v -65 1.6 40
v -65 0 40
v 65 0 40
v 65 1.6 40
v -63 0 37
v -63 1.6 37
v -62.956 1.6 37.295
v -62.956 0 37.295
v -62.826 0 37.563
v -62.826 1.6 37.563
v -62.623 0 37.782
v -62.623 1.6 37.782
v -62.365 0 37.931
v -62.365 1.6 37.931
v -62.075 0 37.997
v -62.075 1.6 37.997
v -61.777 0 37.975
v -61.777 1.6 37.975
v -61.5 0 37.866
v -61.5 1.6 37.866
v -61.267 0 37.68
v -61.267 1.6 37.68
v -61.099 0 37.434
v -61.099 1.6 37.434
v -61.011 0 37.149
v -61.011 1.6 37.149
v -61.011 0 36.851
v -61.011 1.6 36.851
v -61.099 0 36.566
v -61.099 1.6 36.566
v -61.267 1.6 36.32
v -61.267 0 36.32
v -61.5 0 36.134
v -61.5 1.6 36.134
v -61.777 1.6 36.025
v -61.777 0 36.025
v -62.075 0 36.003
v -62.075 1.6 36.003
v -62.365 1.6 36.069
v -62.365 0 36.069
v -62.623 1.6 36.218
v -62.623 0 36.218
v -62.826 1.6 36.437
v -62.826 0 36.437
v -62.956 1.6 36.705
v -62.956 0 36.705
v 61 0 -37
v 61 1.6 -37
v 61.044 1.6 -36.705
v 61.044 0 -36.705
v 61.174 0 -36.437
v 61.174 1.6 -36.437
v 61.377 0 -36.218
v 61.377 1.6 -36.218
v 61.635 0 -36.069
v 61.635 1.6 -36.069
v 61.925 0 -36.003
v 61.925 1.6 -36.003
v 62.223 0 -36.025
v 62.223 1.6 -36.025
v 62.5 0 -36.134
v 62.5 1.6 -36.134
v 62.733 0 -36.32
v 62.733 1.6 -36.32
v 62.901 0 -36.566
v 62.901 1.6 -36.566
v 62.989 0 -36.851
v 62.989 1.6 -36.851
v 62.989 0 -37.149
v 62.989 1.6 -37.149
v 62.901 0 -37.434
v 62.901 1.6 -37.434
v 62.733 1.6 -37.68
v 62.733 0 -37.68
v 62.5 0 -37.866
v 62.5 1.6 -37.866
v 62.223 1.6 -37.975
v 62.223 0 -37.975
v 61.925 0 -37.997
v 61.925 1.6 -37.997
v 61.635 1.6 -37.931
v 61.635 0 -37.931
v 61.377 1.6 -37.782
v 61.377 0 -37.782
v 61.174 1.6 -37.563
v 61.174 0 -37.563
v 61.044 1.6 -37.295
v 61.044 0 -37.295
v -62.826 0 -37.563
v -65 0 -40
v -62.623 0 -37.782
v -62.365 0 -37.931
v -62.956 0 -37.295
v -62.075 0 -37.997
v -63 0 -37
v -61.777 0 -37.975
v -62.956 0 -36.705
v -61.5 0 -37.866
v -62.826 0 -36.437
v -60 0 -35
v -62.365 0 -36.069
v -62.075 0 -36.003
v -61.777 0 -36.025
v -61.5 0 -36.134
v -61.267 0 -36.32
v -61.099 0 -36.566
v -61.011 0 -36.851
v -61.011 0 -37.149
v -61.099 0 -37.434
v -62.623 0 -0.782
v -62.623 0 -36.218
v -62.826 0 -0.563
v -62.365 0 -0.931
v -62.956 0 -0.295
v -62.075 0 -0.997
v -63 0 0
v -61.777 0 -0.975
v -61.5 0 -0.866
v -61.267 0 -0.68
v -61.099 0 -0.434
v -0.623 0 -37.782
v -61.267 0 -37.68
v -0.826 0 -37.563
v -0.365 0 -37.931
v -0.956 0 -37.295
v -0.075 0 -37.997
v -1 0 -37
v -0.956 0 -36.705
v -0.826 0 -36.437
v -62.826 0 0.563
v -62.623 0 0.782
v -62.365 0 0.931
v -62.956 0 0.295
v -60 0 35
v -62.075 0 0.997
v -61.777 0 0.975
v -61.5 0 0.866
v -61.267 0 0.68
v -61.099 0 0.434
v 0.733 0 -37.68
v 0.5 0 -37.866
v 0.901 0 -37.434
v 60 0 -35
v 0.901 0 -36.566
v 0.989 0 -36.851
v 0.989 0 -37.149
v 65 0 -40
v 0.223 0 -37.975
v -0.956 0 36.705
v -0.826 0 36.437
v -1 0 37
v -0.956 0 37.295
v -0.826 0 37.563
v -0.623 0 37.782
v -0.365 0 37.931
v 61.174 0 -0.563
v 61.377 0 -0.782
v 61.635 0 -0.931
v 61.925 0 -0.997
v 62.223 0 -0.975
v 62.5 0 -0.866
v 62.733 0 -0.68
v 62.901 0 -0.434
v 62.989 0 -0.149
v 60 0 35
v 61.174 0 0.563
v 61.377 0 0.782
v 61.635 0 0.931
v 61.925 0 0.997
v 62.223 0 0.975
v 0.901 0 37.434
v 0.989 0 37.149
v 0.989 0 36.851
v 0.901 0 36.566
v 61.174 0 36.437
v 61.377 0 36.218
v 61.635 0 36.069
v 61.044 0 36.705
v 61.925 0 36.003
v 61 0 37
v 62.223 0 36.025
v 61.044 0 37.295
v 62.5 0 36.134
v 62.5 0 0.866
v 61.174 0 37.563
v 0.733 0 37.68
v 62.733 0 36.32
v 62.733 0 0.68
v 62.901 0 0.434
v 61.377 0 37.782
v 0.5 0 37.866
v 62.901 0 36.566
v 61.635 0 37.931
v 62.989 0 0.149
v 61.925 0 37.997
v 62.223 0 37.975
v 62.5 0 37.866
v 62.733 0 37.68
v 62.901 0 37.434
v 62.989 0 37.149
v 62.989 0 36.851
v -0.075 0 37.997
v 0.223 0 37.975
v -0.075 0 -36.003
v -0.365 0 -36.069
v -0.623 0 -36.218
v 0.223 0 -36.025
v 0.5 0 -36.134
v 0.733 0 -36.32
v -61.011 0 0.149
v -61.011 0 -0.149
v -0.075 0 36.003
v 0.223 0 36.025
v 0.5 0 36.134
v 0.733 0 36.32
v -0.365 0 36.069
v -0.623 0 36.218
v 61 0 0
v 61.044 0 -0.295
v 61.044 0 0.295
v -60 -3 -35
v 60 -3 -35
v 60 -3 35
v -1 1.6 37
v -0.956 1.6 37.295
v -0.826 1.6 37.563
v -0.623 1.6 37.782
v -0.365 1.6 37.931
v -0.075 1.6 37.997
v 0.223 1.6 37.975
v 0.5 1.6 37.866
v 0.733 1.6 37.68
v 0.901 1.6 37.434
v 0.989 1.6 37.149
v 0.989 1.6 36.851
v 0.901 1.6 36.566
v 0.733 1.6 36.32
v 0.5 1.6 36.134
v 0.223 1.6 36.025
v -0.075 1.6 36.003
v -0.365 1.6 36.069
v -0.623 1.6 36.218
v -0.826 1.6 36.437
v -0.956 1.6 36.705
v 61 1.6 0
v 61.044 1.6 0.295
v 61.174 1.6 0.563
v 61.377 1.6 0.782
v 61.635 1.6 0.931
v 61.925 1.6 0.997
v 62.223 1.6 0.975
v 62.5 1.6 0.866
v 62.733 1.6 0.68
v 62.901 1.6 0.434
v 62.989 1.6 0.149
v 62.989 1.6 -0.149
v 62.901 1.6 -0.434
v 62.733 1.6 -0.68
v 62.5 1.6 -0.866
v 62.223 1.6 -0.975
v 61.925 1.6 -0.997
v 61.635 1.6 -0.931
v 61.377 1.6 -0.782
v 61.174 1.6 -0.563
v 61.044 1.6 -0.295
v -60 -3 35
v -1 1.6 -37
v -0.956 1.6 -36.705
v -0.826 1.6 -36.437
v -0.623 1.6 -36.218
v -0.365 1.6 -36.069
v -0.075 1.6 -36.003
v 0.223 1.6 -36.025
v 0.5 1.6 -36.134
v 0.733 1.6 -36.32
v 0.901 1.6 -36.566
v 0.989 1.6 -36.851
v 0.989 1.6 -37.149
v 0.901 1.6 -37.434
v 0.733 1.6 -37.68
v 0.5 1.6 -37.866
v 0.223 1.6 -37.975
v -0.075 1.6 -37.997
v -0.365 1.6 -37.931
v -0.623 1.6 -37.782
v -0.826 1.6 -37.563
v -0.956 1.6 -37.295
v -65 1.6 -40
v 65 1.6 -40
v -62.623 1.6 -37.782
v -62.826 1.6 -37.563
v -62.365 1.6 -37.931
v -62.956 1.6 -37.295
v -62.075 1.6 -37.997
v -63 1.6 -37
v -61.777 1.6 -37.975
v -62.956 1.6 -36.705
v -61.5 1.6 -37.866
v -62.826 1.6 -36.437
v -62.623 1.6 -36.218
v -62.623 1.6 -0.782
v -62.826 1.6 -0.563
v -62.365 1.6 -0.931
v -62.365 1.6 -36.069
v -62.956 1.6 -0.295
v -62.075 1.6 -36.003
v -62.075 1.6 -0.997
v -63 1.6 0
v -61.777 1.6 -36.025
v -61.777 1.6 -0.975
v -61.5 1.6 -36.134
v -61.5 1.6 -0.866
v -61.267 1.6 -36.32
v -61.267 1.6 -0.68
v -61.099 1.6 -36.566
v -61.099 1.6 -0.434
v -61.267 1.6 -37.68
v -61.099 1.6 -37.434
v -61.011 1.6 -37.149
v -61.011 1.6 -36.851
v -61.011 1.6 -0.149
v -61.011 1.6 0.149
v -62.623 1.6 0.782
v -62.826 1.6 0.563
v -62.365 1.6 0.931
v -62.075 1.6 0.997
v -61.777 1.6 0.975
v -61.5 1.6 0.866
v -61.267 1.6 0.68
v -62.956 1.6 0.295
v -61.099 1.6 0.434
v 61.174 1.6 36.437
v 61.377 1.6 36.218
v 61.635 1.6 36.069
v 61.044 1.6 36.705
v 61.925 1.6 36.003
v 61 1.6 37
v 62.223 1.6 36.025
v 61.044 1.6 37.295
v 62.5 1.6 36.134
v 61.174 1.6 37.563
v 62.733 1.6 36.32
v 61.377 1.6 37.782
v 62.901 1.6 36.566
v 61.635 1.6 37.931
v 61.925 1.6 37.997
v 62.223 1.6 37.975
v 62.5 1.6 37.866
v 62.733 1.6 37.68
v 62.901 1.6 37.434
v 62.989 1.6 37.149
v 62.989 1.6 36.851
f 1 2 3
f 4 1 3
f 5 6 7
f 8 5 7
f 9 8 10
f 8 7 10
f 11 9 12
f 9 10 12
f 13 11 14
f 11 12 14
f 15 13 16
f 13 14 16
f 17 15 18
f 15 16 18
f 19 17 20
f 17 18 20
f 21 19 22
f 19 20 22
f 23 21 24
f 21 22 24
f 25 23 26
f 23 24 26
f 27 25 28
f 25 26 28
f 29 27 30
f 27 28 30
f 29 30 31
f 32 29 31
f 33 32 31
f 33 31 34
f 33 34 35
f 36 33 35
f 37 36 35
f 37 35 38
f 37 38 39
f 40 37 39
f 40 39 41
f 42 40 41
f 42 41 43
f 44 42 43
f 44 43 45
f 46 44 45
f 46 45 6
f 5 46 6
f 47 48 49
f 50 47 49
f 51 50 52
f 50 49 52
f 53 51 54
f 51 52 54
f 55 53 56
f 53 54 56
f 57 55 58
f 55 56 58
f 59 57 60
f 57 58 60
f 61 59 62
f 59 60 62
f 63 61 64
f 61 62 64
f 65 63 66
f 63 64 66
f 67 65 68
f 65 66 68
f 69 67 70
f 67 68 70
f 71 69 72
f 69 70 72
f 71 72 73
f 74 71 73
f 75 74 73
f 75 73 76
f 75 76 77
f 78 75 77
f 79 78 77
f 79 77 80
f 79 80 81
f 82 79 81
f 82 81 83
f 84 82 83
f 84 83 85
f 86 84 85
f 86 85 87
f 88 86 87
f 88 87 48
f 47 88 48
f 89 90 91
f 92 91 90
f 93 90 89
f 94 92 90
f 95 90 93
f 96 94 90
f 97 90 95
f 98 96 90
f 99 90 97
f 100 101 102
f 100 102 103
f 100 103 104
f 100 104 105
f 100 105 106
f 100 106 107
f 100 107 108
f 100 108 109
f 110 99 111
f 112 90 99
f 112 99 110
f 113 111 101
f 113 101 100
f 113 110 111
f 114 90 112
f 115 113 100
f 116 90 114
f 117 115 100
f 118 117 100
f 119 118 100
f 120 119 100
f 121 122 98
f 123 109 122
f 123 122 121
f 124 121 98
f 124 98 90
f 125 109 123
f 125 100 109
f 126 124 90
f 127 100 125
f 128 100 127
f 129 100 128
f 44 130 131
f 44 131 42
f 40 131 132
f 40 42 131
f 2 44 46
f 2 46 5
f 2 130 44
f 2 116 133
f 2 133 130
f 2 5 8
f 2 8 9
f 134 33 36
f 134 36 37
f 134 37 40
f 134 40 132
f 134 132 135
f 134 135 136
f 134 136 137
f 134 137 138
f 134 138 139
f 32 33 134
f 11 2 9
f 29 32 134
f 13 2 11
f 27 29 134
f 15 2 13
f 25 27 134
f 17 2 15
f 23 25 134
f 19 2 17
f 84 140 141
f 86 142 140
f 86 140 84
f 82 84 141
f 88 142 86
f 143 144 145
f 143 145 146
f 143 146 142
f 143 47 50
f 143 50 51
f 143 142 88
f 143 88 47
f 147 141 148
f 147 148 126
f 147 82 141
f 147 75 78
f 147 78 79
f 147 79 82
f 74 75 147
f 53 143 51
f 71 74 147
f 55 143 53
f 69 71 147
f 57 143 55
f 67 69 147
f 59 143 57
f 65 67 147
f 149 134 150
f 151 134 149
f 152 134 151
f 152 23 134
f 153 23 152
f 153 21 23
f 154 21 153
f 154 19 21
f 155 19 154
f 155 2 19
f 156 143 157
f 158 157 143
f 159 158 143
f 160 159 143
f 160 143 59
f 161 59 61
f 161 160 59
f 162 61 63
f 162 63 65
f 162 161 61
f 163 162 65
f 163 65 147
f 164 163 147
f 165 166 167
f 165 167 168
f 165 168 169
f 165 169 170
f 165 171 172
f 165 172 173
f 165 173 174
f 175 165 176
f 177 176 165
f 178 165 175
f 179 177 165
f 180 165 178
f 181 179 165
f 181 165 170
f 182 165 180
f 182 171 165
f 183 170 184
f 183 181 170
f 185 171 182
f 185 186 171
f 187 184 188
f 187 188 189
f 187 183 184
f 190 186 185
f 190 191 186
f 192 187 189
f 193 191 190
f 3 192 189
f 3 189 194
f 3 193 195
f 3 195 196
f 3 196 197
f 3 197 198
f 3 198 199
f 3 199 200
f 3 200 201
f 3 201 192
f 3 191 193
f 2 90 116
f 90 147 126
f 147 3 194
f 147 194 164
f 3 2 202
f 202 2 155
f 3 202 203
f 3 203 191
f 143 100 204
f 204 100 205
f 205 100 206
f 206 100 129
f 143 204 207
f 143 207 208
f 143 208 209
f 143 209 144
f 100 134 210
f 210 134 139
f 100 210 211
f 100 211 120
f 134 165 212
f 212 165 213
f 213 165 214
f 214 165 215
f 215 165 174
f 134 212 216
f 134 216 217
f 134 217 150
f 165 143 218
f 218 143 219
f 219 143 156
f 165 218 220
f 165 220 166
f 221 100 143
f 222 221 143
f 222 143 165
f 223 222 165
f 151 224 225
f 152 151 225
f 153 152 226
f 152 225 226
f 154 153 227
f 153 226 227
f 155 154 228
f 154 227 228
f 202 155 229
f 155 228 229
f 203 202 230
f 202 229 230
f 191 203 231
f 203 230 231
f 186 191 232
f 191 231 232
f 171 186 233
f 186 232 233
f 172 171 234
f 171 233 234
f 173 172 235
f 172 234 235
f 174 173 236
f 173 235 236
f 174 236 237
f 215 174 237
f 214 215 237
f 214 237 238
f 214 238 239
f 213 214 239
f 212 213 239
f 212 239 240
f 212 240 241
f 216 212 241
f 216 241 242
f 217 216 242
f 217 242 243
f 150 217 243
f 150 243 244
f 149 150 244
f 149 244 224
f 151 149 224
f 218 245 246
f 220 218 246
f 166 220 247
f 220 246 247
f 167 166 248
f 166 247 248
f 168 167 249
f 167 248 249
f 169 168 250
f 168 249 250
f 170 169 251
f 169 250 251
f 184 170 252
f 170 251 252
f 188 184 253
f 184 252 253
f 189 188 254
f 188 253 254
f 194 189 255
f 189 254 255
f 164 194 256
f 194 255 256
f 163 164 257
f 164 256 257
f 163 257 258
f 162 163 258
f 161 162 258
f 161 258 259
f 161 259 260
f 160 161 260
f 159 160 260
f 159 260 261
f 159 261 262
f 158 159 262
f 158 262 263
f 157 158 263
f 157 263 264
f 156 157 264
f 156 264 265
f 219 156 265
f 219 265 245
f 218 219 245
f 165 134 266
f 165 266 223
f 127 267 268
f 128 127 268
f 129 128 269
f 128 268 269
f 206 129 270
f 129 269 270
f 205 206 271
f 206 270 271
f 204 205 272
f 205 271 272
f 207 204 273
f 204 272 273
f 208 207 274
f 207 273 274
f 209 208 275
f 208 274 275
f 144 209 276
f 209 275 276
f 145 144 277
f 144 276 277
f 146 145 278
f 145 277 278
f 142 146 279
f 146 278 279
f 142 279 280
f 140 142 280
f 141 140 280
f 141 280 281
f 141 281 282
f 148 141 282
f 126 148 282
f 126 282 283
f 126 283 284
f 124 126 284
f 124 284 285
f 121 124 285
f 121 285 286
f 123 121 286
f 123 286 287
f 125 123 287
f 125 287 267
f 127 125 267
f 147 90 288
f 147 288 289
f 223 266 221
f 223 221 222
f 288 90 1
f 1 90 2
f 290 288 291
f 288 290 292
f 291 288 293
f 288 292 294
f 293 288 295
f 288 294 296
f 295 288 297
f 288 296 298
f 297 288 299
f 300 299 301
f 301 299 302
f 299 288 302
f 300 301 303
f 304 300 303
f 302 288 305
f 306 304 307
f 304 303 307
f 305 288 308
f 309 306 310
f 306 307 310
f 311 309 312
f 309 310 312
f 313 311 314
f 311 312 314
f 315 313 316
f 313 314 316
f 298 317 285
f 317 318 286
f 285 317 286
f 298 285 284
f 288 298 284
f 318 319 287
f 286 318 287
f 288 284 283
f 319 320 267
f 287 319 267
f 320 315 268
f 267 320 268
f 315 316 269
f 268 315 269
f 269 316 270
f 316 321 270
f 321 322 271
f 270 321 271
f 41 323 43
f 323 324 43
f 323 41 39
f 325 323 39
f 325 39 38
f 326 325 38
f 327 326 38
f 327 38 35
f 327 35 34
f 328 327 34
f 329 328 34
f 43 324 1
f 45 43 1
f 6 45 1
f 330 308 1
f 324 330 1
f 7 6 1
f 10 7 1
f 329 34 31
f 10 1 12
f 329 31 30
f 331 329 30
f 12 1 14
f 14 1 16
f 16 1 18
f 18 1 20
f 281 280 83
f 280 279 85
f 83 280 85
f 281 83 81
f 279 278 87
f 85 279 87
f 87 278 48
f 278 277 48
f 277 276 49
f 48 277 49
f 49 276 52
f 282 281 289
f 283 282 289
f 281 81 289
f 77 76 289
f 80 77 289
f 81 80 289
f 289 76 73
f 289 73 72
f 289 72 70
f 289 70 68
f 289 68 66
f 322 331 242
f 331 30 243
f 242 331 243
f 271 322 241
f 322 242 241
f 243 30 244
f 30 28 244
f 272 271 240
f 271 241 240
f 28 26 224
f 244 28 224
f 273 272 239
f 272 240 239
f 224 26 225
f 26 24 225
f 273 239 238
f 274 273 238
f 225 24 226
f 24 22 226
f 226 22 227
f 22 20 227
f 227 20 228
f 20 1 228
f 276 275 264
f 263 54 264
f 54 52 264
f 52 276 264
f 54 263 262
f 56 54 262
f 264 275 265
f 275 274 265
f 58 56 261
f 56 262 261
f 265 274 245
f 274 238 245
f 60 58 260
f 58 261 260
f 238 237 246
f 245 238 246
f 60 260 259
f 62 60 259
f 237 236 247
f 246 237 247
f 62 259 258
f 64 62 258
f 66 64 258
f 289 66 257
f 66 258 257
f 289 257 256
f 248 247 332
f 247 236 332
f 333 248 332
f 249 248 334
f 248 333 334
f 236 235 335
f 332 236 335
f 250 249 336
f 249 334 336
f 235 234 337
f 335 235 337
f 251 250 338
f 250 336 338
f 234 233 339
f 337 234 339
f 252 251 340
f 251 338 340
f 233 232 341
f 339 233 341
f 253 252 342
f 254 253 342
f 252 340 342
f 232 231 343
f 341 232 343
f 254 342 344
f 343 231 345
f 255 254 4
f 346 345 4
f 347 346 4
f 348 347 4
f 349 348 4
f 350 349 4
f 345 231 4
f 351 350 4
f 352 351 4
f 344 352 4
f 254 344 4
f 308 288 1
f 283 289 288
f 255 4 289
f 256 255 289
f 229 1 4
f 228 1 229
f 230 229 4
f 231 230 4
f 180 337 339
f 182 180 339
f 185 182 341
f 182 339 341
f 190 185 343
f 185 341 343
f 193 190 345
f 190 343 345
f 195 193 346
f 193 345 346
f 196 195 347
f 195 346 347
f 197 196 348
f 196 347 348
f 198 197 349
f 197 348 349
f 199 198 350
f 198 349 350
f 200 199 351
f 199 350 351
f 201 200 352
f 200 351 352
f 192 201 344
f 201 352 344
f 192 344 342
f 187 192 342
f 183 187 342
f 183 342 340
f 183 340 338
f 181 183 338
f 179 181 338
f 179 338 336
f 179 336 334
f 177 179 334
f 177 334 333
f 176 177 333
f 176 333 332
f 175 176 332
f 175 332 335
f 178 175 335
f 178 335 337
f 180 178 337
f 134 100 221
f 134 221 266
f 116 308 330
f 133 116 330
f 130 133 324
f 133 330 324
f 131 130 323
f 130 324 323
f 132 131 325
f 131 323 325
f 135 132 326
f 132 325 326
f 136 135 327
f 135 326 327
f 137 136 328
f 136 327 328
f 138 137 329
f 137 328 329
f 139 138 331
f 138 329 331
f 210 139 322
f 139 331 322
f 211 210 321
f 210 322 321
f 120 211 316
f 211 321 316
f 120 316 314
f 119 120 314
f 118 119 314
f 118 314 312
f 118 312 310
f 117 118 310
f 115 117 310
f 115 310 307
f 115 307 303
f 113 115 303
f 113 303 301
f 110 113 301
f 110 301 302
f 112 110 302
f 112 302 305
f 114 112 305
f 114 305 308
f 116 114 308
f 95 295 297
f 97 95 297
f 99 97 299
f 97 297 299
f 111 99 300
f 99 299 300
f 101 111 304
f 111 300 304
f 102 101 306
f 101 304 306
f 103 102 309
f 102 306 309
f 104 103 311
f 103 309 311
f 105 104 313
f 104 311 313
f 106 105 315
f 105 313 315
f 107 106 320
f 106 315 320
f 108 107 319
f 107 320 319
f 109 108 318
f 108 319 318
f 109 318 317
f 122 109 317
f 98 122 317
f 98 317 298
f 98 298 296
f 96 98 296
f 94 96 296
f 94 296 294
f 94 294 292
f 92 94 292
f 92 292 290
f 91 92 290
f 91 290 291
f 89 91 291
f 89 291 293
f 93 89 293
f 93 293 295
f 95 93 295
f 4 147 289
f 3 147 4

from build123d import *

# Parameters (mm, degrees)
F0_W     = 120
F0_H     = 70
F2_DEPTH = 3
F1_W     = 130
F1_H     = 80
F3_DEPTH = 1.6
F4_D     = 2


with BuildPart() as f2:
    # F0 (on Front) → F2 (new body)
    with BuildSketch(Plane.XZ):
        Rectangle(F0_W, F0_H)
    extrude(amount=F2_DEPTH)

    # F1 (on Front) → F3 (join)
    with BuildSketch(Plane.XZ):
        Rectangle(F1_W, F1_H)
    extrude(amount=-F3_DEPTH)

    # F4 (through all)
    with Locations(Plane.XZ):
        with Locations((62, 37), (62, 0), (62, -37), (0, -37), (0, 37), (-62, 37), (-62, 0), (-62, -37)):
            Hole(F4_D / 2)


solid = f2.part
